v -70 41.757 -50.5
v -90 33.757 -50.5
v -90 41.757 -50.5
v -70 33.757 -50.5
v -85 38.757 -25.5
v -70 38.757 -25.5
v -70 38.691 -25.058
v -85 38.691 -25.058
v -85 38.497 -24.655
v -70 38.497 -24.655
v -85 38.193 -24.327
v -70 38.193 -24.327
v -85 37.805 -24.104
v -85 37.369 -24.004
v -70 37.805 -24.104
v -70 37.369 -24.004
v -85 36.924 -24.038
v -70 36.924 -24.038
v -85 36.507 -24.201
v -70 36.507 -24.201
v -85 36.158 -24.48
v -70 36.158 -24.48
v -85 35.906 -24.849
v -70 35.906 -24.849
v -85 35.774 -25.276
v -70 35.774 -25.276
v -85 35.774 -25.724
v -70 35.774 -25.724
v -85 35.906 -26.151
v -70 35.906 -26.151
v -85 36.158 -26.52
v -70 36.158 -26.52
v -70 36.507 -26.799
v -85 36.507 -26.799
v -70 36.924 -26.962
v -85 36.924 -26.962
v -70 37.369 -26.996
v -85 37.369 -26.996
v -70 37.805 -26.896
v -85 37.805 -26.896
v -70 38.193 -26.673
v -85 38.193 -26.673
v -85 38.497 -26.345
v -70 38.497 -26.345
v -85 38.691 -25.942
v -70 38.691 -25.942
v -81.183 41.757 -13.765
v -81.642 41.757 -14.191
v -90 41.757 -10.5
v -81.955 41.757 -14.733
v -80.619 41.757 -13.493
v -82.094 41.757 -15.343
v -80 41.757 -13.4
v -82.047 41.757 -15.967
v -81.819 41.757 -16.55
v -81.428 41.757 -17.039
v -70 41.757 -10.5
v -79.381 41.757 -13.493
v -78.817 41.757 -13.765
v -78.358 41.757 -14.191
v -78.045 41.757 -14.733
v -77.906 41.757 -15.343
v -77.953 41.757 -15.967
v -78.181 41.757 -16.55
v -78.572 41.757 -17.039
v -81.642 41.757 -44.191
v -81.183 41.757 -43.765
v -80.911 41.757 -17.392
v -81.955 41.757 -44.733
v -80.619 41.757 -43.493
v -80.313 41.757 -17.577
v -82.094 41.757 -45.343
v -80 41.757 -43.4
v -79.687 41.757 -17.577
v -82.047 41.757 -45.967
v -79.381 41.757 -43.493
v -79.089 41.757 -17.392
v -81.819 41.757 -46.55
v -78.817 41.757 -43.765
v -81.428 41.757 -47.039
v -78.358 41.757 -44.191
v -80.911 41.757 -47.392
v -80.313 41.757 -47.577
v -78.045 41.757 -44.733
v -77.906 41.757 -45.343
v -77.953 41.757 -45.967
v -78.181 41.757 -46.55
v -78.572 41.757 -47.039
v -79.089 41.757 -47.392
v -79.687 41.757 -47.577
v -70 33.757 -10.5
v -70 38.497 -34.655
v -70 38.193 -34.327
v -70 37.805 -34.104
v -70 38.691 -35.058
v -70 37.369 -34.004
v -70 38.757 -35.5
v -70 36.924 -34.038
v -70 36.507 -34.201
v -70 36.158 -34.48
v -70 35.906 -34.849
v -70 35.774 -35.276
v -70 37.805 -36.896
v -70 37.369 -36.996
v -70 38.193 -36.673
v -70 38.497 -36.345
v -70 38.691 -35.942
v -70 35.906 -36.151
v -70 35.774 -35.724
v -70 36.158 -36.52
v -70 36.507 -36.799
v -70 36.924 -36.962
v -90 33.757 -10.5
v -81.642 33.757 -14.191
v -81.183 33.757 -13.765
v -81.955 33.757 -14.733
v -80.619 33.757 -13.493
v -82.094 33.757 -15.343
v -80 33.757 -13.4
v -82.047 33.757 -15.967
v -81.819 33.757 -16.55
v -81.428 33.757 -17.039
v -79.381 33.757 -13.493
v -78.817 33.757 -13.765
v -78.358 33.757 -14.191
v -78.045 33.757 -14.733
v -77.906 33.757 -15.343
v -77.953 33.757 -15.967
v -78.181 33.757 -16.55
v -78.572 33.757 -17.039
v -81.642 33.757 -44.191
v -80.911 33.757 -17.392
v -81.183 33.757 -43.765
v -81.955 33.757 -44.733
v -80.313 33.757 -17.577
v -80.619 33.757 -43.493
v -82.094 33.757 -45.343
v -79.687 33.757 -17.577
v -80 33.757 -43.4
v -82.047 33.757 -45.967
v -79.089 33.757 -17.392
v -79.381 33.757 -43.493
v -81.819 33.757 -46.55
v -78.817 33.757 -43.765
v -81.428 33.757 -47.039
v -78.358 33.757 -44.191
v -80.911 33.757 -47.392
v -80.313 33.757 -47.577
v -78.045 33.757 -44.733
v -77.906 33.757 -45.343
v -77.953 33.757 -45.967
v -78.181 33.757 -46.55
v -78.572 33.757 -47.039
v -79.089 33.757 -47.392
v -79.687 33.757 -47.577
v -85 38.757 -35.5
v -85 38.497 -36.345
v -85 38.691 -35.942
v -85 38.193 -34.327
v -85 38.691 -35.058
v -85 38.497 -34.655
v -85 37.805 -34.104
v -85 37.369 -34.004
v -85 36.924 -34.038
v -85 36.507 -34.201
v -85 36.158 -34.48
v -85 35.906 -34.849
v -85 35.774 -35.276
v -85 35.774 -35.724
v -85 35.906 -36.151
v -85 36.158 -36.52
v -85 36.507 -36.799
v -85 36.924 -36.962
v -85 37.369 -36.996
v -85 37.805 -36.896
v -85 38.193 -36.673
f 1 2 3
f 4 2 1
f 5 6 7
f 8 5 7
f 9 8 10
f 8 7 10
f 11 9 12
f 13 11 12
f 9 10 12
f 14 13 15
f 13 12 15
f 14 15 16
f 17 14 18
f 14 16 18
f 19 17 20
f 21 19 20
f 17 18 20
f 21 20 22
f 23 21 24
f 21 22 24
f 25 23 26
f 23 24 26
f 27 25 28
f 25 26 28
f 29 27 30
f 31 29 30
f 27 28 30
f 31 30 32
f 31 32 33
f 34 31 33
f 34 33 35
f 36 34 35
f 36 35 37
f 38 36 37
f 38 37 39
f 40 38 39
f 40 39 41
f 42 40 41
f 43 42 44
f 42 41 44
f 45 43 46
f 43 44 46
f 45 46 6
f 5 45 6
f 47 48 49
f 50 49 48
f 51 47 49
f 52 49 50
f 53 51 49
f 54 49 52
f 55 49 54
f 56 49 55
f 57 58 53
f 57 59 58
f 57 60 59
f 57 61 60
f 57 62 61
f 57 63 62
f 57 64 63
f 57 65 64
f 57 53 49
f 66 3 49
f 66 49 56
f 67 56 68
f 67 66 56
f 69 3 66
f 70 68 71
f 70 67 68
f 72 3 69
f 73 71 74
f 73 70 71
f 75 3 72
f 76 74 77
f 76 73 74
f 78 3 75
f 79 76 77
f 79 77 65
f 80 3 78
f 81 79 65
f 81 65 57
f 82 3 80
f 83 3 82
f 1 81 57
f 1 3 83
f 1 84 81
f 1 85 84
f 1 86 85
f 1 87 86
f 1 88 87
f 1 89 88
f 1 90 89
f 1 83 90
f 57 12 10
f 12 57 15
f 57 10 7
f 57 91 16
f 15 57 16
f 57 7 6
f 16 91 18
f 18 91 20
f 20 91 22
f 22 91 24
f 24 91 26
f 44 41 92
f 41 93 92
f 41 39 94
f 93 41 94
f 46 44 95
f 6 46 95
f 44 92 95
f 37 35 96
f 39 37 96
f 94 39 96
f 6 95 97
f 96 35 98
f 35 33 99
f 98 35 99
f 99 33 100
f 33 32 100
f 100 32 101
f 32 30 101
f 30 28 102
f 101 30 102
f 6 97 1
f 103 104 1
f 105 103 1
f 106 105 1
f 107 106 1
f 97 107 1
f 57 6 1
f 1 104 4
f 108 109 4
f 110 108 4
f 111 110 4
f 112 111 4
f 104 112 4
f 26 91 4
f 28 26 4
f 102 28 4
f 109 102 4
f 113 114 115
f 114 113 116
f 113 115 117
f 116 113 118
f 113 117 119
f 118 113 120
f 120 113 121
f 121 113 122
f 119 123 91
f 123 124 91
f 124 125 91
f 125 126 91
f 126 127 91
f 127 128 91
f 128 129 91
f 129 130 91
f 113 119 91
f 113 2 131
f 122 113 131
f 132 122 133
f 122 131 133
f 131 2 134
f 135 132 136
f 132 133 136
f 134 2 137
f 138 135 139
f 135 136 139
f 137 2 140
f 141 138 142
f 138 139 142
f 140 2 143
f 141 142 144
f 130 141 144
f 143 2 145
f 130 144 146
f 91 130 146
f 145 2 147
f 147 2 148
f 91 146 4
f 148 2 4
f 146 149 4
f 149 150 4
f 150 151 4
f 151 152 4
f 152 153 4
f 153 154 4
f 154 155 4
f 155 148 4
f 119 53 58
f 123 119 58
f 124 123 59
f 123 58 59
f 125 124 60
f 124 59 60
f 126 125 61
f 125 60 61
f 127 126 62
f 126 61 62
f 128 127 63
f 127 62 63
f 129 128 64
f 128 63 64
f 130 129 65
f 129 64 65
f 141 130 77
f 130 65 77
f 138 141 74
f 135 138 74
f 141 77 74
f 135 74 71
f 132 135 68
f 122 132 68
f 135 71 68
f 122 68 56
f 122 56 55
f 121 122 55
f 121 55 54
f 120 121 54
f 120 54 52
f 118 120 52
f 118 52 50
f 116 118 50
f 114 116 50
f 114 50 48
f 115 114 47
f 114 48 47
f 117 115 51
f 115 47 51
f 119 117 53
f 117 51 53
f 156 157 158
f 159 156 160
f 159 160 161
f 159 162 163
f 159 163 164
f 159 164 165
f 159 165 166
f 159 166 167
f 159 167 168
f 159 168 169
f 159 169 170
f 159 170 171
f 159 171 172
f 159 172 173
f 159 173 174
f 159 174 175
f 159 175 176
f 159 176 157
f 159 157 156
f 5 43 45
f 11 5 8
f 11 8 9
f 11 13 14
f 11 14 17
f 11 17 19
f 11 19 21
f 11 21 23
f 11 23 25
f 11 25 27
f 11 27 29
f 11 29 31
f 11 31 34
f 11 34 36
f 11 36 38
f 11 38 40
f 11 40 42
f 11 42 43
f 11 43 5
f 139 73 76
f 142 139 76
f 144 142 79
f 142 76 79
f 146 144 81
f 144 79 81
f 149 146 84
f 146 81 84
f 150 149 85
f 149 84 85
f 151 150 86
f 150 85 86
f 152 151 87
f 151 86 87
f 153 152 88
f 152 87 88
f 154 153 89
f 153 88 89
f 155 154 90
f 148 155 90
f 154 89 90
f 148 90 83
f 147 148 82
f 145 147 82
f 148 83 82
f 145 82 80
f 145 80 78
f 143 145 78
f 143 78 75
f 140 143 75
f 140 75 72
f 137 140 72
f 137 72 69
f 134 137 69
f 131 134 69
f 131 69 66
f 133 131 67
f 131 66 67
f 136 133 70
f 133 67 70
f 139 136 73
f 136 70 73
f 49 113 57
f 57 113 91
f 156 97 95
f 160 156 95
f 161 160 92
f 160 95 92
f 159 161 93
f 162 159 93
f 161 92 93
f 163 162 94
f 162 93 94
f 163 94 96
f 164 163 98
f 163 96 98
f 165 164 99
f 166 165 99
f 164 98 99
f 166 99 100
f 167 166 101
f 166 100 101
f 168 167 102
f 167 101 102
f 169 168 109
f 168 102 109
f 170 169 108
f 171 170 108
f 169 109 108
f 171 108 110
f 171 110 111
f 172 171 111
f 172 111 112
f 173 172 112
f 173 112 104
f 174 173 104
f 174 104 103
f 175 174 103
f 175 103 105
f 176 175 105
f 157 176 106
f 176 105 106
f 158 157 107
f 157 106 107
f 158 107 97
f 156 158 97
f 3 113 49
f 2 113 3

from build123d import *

# Parameters (mm, degrees)
SKETCH2_W           = 20
SKETCH2_H           = 40
BOSS_EXTRUDE2_DEPTH = 8
SKETCH3_R           = 2.1
CUT_EXTRUDE1_DEPTH  = 8
SKETCH4_R           = 1.5
CUT_EXTRUDE2_DEPTH  = 15


with BuildPart() as part:
    # Sketch2 → Boss-Extrude2 (new body)
    with BuildSketch(Plane(origin=(0, 33.757283518, 0), x_dir=(1, 0, 0), z_dir=(0, 1, 0))):
        with Locations((-80, 30.5)):
            Rectangle(SKETCH2_W, SKETCH2_H)
    extrude(amount=BOSS_EXTRUDE2_DEPTH)

    # Sketch3 → Cut-Extrude1 (cut)
    with BuildSketch(Plane(origin=(0, 41.757283518, 0), x_dir=(1, 0, 0), z_dir=(0, 1, 0))):
        with Locations(Location((-80, 15.5, 0), (0, 0, 270))):
            Circle(SKETCH3_R)
        with Locations(Location((-80, 45.5, 0), (0, 0, 270))):
            Circle(SKETCH3_R)
    extrude(amount=-CUT_EXTRUDE1_DEPTH, mode=Mode.SUBTRACT)

    # Sketch4 → Cut-Extrude2 (cut)
    with BuildSketch(Plane(origin=(-70, 0, 0), x_dir=(0, 0, -1), z_dir=(1, 0, 0))):
        with Locations(Location((25.5, 37.257283518, 0), (0, 0, 90))):
            Circle(SKETCH4_R)
        with Locations(Location((35.5, 37.257283518, 0), (0, 0, 90))):
            Circle(SKETCH4_R)
    extrude(amount=-CUT_EXTRUDE2_DEPTH, mode=Mode.SUBTRACT)


solid = part.part
